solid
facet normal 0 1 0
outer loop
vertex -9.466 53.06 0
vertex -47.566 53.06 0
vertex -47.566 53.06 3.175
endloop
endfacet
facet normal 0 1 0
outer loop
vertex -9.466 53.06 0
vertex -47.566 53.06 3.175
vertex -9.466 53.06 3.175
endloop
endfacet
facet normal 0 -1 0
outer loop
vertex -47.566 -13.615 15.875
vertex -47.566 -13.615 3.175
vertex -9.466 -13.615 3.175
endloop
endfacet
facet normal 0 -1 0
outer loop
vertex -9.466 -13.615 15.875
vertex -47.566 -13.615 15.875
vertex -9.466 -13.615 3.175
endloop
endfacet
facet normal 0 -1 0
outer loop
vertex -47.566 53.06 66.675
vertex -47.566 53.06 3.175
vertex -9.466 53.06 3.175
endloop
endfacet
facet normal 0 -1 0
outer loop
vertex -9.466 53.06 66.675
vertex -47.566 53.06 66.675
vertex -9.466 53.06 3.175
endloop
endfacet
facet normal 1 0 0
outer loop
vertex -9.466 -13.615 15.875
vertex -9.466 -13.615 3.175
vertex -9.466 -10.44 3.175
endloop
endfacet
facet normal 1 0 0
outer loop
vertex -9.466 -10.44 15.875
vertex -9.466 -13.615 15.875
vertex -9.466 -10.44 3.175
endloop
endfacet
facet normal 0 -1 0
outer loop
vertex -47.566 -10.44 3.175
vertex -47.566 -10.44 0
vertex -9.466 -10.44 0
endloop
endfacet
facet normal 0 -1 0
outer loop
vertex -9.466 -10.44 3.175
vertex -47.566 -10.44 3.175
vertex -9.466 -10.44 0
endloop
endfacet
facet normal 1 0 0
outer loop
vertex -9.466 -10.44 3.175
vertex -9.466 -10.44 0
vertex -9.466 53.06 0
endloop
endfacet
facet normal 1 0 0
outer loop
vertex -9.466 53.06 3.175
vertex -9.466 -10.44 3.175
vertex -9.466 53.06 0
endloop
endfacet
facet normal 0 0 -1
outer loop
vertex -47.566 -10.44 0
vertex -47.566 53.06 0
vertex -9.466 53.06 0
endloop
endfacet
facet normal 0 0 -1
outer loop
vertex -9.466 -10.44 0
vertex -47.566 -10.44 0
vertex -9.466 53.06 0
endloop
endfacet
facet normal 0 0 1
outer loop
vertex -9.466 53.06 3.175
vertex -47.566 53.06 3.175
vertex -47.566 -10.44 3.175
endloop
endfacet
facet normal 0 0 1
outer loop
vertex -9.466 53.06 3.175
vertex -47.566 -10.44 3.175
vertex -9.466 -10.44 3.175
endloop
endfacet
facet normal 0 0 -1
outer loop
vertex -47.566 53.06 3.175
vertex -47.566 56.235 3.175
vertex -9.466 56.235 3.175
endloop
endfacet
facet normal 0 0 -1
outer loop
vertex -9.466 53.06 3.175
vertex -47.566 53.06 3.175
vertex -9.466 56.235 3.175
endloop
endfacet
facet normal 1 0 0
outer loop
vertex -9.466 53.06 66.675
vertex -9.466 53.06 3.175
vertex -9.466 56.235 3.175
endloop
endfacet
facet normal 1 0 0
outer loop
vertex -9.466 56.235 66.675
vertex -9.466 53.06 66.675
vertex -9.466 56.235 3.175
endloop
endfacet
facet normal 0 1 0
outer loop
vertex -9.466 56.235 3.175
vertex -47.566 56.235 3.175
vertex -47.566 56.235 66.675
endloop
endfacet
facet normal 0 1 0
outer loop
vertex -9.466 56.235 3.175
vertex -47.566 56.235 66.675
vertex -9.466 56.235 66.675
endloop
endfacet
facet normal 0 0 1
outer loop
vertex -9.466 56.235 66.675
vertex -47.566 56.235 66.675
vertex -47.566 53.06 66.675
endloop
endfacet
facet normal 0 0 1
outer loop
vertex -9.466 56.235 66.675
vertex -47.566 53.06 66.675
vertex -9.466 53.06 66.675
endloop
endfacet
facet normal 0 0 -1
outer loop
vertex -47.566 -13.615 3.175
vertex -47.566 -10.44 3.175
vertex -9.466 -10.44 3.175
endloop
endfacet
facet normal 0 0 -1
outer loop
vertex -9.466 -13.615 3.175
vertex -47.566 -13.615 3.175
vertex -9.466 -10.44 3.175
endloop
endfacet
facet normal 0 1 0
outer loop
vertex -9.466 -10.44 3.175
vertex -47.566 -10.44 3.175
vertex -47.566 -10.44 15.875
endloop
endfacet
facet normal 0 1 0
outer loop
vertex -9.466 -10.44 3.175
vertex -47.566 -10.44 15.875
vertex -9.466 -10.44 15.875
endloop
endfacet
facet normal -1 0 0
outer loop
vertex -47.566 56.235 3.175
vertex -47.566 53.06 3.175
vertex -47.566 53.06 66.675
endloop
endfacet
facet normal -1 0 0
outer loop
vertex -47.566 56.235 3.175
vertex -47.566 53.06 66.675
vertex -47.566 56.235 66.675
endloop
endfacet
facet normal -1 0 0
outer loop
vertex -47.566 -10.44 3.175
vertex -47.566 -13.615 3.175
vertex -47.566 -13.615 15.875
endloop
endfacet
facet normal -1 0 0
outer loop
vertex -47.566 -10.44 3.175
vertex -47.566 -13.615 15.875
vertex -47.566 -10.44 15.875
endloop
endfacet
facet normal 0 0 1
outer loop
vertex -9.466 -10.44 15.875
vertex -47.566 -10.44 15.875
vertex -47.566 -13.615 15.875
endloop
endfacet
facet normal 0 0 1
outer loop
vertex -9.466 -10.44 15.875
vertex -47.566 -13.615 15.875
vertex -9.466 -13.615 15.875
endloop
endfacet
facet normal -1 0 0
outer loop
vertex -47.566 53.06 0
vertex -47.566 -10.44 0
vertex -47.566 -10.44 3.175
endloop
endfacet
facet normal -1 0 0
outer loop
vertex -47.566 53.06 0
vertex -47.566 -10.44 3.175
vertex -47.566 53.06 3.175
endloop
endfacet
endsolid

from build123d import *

# Parameters (mm, degrees)
F0_W     = 38.1
F0_H     = 63.5
F1_DEPTH = 3.175
F2_W     = 38.1
F2_H     = 3.175
F3_DEPTH = 63.5
F4_W     = 38.1
F4_H     = 3.175
F5_DEPTH = 12.7


with BuildPart() as f1:
    # F0 (on Top) → F1 (new body)
    with BuildSketch(Plane.XY):
        with Locations((-28.516022, 21.309891)):
            Rectangle(F0_W, F0_H)
    extrude(amount=F1_DEPTH)


with BuildPart() as f3:
    # F2 (on face) → F3 (new body)
    with BuildSketch(Plane.XY.offset(3.175)):
        with Locations((-28.516022, 54.647391)):
            Rectangle(F2_W, F2_H)
    extrude(amount=F3_DEPTH)


with BuildPart() as f5:
    # F4 (on face) → F5 (new body)
    with BuildSketch(Plane.XY.offset(3.175)):
        with Locations((-28.516022, -12.027609)):
            Rectangle(F4_W, F4_H)
    extrude(amount=F5_DEPTH)


solid = Compound([f1.part, f3.part, f5.part])
